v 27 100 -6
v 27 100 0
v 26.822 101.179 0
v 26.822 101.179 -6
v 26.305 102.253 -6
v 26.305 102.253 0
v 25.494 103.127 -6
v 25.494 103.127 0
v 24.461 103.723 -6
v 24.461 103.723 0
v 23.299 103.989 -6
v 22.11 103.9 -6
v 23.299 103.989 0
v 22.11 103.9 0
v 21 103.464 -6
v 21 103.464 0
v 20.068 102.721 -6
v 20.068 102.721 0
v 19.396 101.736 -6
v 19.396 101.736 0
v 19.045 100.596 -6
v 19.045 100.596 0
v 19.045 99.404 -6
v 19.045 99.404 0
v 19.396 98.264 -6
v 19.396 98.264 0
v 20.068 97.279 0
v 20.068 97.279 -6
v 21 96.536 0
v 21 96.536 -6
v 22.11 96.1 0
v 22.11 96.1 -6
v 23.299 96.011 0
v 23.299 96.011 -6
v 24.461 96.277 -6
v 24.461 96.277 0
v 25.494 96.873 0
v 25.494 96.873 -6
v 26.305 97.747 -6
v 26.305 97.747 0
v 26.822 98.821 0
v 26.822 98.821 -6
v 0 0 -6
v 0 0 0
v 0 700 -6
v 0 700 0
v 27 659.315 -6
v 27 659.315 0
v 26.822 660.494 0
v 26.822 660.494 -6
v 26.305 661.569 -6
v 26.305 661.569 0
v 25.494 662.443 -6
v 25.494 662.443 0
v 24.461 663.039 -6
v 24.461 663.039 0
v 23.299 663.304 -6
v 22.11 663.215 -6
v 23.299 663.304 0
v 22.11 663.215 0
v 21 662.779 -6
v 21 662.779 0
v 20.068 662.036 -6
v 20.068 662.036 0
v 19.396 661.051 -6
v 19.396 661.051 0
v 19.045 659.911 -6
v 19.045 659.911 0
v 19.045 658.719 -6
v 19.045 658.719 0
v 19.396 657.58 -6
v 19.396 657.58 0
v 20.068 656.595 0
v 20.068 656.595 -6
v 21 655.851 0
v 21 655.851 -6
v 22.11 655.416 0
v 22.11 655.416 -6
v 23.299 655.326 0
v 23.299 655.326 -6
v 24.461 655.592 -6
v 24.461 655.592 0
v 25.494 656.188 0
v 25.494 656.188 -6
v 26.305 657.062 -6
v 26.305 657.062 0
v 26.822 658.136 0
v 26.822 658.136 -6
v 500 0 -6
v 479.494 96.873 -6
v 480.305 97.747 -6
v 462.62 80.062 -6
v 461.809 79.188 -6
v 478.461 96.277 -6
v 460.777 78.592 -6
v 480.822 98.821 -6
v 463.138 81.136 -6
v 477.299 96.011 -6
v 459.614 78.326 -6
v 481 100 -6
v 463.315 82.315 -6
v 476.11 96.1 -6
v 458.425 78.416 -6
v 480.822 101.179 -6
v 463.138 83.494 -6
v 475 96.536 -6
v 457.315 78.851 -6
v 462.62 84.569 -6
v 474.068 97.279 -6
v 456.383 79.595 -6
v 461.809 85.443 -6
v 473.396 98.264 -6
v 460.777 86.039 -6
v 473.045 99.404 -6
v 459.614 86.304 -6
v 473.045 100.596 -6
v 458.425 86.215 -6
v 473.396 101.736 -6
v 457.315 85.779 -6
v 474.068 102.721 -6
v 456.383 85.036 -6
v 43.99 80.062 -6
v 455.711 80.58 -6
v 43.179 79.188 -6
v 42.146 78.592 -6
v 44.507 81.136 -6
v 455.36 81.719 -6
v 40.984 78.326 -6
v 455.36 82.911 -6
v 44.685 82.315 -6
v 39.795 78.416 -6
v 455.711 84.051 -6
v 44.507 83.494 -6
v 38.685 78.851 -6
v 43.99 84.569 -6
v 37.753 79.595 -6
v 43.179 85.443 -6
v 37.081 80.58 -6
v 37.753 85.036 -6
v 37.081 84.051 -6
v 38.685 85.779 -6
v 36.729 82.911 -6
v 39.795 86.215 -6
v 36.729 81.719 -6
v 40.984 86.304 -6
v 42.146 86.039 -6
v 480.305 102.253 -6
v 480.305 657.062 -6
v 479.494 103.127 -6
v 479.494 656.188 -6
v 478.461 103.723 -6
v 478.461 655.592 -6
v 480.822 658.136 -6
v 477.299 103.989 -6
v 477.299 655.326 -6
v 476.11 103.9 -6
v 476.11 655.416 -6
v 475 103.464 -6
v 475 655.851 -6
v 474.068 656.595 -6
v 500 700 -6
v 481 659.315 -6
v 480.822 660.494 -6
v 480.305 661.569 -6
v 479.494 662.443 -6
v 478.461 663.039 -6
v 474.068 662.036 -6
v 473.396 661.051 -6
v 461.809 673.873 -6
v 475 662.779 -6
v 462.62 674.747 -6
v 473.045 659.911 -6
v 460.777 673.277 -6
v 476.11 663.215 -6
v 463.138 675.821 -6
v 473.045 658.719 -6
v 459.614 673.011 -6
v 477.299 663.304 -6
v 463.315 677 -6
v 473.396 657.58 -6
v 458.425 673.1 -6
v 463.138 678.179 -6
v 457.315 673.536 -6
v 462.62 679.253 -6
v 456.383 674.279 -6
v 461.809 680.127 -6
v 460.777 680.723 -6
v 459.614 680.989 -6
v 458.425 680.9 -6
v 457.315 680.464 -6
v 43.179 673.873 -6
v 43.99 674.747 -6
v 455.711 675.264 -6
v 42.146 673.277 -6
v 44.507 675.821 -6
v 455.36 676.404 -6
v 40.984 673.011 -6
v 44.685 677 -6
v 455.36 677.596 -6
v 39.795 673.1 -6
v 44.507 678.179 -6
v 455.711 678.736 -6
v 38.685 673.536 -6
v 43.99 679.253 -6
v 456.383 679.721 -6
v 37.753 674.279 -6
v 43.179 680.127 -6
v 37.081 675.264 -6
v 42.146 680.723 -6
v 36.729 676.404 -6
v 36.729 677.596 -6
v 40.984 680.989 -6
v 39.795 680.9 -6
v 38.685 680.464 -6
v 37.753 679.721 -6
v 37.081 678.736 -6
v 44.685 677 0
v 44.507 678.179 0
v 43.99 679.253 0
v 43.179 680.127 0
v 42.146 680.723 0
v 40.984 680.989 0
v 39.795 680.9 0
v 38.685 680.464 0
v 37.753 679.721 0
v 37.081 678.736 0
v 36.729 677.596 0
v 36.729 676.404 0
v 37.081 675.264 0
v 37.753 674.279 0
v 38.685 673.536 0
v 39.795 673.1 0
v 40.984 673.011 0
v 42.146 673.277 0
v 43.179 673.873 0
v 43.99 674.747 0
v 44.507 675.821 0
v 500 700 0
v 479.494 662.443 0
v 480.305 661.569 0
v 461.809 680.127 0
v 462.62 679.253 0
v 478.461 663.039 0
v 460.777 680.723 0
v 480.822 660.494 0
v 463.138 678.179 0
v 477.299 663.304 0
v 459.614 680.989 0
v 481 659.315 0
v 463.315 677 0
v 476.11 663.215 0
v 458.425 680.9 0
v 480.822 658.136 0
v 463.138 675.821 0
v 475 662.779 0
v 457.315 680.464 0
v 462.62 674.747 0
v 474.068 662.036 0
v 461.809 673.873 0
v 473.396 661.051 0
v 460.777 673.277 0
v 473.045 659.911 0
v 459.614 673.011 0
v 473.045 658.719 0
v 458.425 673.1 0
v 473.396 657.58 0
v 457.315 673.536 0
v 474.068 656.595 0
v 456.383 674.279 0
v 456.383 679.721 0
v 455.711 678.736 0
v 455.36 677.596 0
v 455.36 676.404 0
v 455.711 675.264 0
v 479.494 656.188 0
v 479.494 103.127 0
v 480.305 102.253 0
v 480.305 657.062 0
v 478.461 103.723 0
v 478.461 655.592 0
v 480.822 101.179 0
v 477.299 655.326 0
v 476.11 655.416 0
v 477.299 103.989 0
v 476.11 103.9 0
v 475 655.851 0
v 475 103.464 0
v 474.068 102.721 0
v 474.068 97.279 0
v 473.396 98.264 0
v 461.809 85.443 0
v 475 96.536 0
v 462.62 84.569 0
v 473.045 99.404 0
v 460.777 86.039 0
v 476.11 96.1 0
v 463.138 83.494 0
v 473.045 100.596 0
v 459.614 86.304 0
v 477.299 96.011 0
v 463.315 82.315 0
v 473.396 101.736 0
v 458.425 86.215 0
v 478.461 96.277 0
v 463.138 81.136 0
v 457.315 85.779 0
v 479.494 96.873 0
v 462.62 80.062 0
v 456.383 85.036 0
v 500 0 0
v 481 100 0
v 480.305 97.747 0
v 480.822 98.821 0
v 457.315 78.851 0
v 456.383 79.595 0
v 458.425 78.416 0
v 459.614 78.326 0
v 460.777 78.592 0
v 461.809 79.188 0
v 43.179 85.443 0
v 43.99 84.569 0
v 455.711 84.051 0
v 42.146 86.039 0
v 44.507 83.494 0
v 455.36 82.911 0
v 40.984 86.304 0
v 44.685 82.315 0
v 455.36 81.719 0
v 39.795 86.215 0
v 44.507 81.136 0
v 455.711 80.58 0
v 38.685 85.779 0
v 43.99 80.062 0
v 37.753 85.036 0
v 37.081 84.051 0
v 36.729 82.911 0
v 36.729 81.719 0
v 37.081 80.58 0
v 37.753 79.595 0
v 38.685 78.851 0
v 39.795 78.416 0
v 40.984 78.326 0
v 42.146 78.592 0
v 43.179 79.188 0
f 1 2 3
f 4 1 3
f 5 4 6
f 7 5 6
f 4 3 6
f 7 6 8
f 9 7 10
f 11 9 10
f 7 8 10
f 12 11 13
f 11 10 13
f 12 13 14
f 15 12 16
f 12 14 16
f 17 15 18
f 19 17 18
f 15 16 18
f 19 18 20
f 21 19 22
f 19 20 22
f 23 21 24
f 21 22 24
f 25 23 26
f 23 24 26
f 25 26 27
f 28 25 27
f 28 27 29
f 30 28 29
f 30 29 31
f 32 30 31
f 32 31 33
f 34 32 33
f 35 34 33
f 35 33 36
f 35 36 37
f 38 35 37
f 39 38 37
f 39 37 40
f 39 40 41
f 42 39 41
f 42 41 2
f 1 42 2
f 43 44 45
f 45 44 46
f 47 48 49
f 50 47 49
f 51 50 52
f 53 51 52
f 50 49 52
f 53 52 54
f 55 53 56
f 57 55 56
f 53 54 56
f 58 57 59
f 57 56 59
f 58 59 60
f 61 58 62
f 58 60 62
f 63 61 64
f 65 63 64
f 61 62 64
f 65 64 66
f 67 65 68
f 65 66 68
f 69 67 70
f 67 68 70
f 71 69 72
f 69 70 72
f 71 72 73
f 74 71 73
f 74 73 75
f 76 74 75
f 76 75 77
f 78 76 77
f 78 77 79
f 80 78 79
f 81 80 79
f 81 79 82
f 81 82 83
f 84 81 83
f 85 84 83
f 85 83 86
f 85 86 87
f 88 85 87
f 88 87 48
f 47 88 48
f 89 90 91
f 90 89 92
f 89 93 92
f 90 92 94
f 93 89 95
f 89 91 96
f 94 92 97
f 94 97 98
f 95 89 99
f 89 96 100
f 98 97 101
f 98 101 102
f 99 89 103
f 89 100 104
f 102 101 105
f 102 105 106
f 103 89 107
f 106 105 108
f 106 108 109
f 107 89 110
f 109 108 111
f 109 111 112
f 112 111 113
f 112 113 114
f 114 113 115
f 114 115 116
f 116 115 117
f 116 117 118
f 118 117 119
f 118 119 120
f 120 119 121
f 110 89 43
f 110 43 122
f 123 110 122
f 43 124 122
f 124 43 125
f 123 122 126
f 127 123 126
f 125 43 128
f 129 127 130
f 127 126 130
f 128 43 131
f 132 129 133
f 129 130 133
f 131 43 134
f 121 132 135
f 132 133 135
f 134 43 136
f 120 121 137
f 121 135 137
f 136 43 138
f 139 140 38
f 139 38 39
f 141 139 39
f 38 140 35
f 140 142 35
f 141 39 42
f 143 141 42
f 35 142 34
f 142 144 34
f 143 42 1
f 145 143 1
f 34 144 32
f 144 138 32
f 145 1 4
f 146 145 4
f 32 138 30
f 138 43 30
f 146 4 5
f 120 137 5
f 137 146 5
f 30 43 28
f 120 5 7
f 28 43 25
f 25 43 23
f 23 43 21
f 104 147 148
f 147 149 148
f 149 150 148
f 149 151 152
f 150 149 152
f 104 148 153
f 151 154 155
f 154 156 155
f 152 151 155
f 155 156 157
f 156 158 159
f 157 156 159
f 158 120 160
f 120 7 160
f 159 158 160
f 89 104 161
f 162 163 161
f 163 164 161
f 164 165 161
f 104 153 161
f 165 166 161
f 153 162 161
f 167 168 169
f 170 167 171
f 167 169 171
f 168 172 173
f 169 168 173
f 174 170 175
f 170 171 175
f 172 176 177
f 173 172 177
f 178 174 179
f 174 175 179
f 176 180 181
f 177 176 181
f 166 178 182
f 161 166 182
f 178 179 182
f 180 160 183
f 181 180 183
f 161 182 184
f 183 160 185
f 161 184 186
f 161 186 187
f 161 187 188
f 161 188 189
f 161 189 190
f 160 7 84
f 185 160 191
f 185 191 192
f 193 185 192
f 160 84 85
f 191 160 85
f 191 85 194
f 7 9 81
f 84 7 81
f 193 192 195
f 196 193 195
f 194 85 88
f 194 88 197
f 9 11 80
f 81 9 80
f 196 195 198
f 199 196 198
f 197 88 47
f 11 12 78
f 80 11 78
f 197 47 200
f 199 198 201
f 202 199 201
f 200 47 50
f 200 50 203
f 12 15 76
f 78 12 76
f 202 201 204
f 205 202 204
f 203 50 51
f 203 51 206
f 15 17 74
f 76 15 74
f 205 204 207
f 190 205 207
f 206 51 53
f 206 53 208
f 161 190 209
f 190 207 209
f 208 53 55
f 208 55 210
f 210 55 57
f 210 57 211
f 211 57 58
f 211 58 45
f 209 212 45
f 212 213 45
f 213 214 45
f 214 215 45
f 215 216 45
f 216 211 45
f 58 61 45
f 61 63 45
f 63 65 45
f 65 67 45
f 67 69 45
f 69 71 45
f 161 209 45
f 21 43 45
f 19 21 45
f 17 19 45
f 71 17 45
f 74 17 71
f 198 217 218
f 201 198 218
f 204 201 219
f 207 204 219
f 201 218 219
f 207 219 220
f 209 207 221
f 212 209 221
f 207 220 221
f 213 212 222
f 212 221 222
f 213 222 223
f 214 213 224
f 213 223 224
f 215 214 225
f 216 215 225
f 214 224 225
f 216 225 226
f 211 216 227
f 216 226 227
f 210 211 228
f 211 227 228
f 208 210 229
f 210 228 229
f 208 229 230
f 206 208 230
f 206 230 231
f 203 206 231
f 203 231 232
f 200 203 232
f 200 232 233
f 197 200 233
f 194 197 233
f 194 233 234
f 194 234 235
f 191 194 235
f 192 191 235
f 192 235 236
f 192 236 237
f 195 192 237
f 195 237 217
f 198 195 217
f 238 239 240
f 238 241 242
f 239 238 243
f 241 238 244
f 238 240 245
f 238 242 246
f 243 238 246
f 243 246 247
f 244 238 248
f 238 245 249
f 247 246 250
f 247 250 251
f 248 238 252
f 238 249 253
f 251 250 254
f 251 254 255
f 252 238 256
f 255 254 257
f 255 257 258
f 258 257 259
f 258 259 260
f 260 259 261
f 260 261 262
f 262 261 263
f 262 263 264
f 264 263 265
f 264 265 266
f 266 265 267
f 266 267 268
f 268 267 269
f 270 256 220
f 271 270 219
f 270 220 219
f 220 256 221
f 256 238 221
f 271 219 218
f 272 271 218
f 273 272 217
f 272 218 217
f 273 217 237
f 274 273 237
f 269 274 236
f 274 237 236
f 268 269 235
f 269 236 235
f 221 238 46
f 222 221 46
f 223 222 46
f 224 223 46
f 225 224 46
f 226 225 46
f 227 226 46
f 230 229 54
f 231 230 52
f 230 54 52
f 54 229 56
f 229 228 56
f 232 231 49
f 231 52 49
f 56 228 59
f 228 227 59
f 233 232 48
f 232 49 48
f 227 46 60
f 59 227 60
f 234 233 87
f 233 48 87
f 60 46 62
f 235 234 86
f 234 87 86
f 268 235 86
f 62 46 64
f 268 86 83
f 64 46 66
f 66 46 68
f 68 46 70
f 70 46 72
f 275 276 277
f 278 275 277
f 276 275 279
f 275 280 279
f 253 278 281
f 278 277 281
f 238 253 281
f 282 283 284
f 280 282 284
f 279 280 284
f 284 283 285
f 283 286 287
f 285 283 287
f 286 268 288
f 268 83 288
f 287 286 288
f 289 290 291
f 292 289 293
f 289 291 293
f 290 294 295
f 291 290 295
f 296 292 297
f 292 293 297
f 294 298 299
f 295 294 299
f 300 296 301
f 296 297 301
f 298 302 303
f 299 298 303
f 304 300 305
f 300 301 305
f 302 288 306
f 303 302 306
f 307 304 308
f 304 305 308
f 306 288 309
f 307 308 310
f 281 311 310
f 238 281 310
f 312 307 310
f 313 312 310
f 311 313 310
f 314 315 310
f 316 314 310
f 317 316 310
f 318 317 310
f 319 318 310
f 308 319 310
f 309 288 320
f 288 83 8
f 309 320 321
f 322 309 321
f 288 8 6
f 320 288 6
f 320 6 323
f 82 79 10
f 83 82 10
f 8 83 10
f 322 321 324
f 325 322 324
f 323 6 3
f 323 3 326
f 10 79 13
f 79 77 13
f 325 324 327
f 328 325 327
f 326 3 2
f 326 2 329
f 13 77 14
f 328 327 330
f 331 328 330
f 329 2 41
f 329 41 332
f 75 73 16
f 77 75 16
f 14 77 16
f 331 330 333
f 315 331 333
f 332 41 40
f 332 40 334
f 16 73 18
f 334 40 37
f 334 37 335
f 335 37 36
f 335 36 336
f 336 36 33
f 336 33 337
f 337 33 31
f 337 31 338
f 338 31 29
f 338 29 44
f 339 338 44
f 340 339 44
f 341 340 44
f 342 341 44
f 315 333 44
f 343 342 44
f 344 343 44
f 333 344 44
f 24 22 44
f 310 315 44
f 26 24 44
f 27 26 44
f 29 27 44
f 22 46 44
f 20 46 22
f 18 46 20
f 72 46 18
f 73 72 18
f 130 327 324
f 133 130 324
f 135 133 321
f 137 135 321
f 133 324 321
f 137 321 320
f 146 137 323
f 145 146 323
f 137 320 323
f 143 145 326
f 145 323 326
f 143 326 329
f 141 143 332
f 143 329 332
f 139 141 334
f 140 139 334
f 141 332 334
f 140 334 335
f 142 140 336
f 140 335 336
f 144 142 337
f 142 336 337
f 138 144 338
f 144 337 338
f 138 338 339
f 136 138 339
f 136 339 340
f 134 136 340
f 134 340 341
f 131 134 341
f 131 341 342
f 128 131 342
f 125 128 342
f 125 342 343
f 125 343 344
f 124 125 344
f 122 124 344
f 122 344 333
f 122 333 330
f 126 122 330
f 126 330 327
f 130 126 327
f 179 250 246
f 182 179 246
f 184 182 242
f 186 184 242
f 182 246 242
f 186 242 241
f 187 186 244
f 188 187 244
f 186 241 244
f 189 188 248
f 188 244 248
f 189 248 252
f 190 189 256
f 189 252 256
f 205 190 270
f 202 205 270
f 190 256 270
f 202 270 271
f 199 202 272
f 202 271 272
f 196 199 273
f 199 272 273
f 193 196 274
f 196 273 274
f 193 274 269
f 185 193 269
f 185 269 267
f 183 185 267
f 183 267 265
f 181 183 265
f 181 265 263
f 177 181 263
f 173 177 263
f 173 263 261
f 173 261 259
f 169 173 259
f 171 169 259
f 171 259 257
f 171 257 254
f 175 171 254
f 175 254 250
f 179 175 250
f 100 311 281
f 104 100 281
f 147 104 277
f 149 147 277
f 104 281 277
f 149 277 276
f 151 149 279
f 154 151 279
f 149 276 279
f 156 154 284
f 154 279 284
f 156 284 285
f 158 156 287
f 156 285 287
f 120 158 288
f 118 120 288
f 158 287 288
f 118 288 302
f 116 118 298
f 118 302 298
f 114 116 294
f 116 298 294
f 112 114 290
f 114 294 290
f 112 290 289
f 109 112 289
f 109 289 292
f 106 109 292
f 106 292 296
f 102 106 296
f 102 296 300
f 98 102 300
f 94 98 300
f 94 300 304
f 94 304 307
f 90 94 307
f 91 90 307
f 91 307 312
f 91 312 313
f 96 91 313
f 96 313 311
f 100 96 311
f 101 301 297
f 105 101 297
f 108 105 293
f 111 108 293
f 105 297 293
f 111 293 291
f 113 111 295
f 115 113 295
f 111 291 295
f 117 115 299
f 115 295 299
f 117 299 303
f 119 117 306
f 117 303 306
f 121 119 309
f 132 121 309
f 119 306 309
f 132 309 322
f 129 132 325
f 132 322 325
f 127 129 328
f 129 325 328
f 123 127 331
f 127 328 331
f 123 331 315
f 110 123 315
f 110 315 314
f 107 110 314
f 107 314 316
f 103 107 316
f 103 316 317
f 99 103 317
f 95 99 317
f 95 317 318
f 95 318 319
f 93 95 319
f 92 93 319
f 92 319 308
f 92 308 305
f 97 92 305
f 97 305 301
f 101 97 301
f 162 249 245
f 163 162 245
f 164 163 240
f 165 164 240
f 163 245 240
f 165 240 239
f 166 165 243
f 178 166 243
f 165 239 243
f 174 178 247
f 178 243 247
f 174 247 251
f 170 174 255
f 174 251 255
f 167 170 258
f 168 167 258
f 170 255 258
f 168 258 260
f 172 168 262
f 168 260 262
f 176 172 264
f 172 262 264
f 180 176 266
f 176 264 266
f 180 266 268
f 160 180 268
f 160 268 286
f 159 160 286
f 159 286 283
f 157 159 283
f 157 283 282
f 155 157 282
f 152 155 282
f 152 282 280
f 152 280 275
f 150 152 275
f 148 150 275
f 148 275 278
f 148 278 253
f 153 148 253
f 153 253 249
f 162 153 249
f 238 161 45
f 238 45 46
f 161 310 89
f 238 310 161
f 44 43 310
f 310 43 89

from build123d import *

# Parameters (mm, degrees)
F1_DEPTH = 500
F3_DEPTH = 23.191775822
F4_R     = 4
F5_DEPTH = 6.001
F6_W     = 500
F6_H     = 122.3183423281
F7_DEPTH = 23.3658177667


with BuildPart() as f1:
    # F0 (on Right) → F1 (new body)
    with BuildSketch(Plane.YZ):
        Polygon((700, 0), (0, 0), (-98.4807753012, 17.3648177667), (-99.5226643672, 11.4559712486), (0, -6), (700, -6), align=None)
    extrude(amount=F1_DEPTH)

    # F2 (on face) → F3 (cut, through all)
    with BuildSketch(Plane(origin=(0, 0, 0), x_dir=(1, 0, 0), z_dir=(0, 0.1736481777, 0.984807753))):
        with BuildLine():
            Line((0, -100), (50, -100))
            ThreePointArc((50, -100), (14.6446609407, -85.3553390593), (0, -50))
            Line((0, -50), (0, -100))
        make_face()
        with BuildLine():
            ThreePointArc((500, -50), (485.3553390593, -85.3553390593), (450, -100))
            Line((450, -100), (500, -100))
            Line((500, -100), (500, -50))
        make_face()
    extrude(amount=-F3_DEPTH, mode=Mode.SUBTRACT)

    # F4 (on face) → F5 (cut, through all)
    with BuildSketch(Plane.XY):
        with Locations((23, 100)):
            Circle(F4_R)
        with Locations((40.6847405975, 82.3152594025)):
            Circle(F4_R)
        with Locations((23, 659.3152594025)):
            Circle(F4_R)
        with Locations((40.6847405975, 677)):
            Circle(F4_R)
        with Locations((459.3152594025, 677)):
            Circle(F4_R)
        with Locations((477, 659.3152594025)):
            Circle(F4_R)
        with Locations((477, 100)):
            Circle(F4_R)
        with Locations((459.3152594025, 82.3152594025)):
            Circle(F4_R)
    extrude(amount=-F5_DEPTH, mode=Mode.SUBTRACT)

    # F6 (on face) → F7 (cut, through all)
    with BuildSketch(Plane(origin=(0, 0, -6), x_dir=(1, 0, 0), z_dir=(0, 0, -1))):
        with Locations((250, 61.159171164)):
            Rectangle(F6_W, F6_H)
    extrude(amount=-F7_DEPTH, mode=Mode.SUBTRACT)


solid = f1.part
